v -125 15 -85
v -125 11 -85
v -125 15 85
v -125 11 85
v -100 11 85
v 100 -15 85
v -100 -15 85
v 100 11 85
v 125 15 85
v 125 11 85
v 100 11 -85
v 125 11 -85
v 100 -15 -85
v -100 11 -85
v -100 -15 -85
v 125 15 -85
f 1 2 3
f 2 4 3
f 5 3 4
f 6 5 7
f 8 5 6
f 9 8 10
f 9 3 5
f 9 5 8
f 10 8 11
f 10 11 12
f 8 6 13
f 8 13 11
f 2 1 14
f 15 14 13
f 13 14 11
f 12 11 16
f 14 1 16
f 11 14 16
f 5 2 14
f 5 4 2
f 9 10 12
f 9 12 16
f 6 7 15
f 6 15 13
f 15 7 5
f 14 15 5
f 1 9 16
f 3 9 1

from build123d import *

# Parameters (mm, degrees)
SKETCH1_W           = 200
SKETCH1_H           = 30
SKETCH1_W_2         = 25
SKETCH1_H_2         = 4
BOSS_EXTRUDE1_DEPTH = 85


with BuildPart() as part:
    # Sketch1 → Boss-Extrude1 (new, symmetric)
    with BuildSketch(Plane.XY):
        Rectangle(SKETCH1_W, SKETCH1_H)
        with Locations((-112.5, 13)):
            Rectangle(SKETCH1_W_2, SKETCH1_H_2)
        with Locations((112.5, 13)):
            Rectangle(SKETCH1_W_2, SKETCH1_H_2)
    extrude(amount=BOSS_EXTRUDE1_DEPTH, both=True)


solid = part.part
